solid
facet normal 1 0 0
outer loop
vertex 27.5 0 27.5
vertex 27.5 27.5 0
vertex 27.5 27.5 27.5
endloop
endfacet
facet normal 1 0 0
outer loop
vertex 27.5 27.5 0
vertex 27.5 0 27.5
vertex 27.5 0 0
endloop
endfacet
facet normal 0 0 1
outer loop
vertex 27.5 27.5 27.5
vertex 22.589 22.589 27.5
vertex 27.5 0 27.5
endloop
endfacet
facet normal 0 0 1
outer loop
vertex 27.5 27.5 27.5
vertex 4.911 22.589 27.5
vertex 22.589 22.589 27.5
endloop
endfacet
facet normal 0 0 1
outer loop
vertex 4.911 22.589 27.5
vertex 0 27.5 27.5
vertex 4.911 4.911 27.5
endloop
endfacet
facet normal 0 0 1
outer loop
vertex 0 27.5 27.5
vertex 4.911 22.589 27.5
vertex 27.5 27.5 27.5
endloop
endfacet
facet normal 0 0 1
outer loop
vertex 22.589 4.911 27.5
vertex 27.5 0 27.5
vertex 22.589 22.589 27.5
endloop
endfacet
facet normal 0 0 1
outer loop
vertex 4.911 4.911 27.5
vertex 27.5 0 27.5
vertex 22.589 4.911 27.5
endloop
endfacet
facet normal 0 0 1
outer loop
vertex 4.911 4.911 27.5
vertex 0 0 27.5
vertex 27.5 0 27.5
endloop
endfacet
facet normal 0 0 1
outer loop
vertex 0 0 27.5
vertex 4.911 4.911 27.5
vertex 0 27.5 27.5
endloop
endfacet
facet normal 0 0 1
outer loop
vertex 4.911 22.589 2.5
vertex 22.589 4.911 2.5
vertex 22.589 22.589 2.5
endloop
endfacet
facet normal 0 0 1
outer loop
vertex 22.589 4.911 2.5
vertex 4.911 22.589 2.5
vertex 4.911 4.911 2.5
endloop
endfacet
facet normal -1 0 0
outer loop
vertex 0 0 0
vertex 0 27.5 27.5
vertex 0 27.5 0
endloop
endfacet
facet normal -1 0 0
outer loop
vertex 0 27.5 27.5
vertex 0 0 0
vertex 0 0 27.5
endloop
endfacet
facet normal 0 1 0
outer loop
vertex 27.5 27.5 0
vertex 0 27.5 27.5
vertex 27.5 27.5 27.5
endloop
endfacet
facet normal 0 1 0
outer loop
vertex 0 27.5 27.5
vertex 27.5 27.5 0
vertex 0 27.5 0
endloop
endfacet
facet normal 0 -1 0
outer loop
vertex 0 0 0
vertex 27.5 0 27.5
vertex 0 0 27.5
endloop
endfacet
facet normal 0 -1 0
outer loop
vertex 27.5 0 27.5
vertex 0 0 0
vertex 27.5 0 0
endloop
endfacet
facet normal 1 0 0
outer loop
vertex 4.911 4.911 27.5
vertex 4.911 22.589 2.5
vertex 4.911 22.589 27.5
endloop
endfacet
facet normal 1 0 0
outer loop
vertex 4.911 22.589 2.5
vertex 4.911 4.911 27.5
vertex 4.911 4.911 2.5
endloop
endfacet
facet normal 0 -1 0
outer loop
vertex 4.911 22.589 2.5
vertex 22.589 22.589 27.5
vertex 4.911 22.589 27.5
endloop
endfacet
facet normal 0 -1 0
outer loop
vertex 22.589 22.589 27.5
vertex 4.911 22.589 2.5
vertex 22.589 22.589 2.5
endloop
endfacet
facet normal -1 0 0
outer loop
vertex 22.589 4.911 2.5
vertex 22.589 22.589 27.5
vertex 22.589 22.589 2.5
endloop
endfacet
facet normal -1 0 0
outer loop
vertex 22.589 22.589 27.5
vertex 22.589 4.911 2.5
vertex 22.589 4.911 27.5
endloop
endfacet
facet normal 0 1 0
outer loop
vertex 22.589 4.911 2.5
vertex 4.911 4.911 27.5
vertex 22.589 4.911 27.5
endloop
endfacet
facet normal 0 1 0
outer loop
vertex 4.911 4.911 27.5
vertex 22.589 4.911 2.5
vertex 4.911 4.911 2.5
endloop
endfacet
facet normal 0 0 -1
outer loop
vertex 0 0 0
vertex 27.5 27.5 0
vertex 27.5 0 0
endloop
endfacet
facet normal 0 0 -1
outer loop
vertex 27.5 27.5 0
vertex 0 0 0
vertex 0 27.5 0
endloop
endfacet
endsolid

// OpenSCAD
/*
————————————————————————————————————————————————————————————————————————————————
CONFIG
————————————————————————————————————————————————————————————————————————————————
*/
$fn=360 / 10;

Outer_shell_width = 25 + 2.5;
Outer_shell_length = 25 + 2.5;
Outer_shell_height = 25 + 2.5;

Min_floor_height = 2.5;

Modules = [1, 1]; // cols, rows

Hang_depth_height = -25; // negative = hole depth, positive = pin height. 
Hang_diameter = 25;
Hang_faces = 4;
Hang_rotation = 360 / Hang_faces / 2;

Rendering_transp = 0.9;




/*
————————————————————————————————————————————————————————————————————————————————
MODULES
————————————————————————————————————————————————————————————————————————————————
*/
module start(){
	echo("Script start");
	
	color("red", Rendering_transp)  cube([ // floor
		Outer_shell_width,
		Outer_shell_length,
		Min_floor_height
	]);

	unit_dimensions = [
		Outer_shell_width / Modules[1],
		Outer_shell_length / Modules[0],
		Outer_shell_height - Min_floor_height
	];


	translate([0, 0, Min_floor_height]){ // move up for bottom safe area
		for (
			unit_row_index = [1 : Modules[0]]
		){
			for (
				unit_column_index = [1 : Modules[1]]
			){
				translate([
					(unit_column_index - 1) * unit_dimensions[0],
					(unit_row_index - 1) * unit_dimensions[1],
					0
				]){
					unit(unit_dimensions);
				}
			}
		}
	}

	echo("Script end");
}


module unit(unit_dimensions) {
	if( Hang_depth_height > 0 ){
		union(){
			unit_shell(unit_dimensions);
			hanger(Hang_depth_height, Hang_diameter, unit_dimensions);
		};
	}else{
		difference(){
			unit_shell(unit_dimensions);
			hanger(Hang_depth_height, Hang_diameter, unit_dimensions);
		};
	}
}


module unit_shell(unit_dimensions) {
	color("orange", Rendering_transp) cube(unit_dimensions); // module unit
}


module hanger(Hang_depth_height, diameter, unit_dimensions) {
	translate([
		unit_dimensions[0] / 2,
		unit_dimensions[1] / 2,
		unit_dimensions[2] + (
			Hang_depth_height > 0 ? 0 : Hang_depth_height
		)
	]){
		rotate([
			0 , 0 , Hang_rotation
		]){
			color("yellow", Rendering_transp) cylinder( // hangers
				h = abs(Hang_depth_height), 
				r1 = diameter / 2, 
				r2 = diameter / 2, 
				center = false,
				$fn = Hang_faces
			);
		}
	}
}




/*
————————————————————————————————————————————————————————————————————————————————
BOOTSTRAP
————————————————————————————————————————————————————————————————————————————————
*/
start();
